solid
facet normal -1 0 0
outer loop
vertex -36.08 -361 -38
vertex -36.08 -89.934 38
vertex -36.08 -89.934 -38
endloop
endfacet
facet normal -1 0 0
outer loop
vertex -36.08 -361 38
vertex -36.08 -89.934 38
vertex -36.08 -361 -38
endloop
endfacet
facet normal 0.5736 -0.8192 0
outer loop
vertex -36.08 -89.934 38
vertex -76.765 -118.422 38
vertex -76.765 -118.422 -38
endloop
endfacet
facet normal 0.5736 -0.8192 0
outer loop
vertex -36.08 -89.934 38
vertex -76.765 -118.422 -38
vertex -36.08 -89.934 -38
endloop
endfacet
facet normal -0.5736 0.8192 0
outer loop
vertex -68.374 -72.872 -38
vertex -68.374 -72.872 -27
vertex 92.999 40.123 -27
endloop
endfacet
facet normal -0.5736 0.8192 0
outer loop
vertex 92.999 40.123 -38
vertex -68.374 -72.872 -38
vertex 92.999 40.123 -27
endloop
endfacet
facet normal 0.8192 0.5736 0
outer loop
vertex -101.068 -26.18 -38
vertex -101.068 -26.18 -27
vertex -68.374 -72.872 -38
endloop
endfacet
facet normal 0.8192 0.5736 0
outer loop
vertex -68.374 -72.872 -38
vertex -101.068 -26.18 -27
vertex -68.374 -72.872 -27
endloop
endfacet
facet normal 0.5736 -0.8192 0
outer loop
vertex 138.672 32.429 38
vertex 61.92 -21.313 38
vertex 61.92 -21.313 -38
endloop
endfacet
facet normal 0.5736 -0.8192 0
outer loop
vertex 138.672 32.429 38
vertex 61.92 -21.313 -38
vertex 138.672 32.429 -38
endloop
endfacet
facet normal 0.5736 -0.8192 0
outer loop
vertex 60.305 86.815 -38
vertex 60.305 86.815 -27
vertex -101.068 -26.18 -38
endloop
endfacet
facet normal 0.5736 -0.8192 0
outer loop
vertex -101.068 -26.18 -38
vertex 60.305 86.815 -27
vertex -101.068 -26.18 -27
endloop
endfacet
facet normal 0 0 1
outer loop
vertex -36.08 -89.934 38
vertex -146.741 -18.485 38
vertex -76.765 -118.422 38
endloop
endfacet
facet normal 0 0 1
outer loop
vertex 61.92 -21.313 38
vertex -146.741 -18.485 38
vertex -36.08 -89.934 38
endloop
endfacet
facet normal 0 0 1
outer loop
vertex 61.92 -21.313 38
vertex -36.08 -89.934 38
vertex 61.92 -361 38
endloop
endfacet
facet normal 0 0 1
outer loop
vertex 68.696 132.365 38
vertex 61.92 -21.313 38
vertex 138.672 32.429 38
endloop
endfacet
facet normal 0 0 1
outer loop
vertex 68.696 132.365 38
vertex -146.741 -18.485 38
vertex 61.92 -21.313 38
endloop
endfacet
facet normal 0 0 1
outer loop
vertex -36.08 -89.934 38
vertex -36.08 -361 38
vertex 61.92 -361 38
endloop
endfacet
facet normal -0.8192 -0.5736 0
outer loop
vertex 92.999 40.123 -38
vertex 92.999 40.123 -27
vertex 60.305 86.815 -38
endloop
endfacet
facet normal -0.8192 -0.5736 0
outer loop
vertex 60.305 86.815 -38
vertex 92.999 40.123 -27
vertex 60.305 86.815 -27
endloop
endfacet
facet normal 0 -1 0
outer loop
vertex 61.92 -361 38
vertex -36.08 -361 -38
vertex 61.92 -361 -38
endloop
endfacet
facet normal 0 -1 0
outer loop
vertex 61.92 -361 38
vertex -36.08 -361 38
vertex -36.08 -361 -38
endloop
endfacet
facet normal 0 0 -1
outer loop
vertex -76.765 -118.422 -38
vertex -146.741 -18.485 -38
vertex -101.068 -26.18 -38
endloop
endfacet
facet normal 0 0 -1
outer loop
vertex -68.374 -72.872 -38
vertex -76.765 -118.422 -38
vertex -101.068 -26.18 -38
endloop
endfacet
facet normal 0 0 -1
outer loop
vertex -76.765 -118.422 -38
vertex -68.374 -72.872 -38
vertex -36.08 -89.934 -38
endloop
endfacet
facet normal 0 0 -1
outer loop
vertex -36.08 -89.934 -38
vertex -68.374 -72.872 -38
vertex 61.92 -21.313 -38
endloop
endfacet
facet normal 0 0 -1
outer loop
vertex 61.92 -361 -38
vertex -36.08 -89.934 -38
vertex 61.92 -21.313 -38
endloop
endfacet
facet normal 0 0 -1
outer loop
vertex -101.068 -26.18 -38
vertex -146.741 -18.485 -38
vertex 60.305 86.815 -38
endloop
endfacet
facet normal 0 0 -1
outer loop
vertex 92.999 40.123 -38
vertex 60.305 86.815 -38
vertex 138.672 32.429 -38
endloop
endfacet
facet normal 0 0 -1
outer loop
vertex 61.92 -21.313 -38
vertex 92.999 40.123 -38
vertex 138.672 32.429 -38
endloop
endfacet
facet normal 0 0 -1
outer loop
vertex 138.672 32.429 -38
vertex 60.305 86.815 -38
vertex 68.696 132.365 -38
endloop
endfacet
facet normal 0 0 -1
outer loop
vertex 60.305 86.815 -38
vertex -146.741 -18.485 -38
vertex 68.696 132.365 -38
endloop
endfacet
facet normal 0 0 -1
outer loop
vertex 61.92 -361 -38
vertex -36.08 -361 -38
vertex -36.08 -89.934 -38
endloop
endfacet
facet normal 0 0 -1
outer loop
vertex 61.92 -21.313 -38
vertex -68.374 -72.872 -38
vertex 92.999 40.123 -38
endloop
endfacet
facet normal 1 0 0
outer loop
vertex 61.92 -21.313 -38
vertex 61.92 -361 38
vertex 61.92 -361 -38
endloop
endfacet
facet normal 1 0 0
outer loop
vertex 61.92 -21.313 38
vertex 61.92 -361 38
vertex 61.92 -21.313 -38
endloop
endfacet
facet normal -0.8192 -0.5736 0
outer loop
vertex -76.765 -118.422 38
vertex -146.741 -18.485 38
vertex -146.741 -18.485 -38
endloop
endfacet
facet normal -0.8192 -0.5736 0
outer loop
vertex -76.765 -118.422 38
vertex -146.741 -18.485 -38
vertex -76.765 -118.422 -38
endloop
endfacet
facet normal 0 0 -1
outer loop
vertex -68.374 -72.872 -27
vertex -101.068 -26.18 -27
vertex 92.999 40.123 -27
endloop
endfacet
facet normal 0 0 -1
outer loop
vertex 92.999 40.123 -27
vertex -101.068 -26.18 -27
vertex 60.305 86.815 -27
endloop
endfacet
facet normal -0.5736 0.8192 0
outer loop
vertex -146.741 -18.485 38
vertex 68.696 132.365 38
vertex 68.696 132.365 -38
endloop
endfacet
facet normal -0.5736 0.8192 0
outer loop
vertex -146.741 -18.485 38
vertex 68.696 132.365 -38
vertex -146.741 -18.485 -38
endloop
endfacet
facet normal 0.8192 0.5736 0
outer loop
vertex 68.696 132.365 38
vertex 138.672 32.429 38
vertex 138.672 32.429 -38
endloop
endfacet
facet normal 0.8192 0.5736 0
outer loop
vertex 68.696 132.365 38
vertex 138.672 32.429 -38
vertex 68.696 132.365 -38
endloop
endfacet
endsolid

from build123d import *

# Parameters (mm, degrees)
SALIENTE_EXTRUIR1_DEPTH = 38
CORTAR_EXTRUIR4_START   = -38
CORTAR_EXTRUIR4_DEPTH   = 11


with BuildPart() as part:
    # Croquis1 → Saliente-Extruir1 (new, symmetric)
    with BuildSketch(Plane.XY):
        Polygon((-1.079549163, -361), (61.920450837, -361), (61.920450837, -21.313279486), (138.671836045, 32.428619004), (68.69551081, 132.365168408), (-146.741476838, -18.485434353), (-76.765151603, -118.421983756), (-36.079549163, -89.933618231), (-36.079549163, -361), align=None)
    extrude(amount=SALIENTE_EXTRUIR1_DEPTH, both=True)

    # Croquis2 → Cortar-Extruir4 (cut, symmetric)
    with BuildSketch(Plane.XY.offset(CORTAR_EXTRUIR4_START)):
        Polygon((-101.068225195, -26.179853393), (-68.374368323, -72.871519917), (92.998584402, 40.123038044), (60.30472753, 86.814704569), align=None)
    extrude(amount=CORTAR_EXTRUIR4_DEPTH, both=True, mode=Mode.SUBTRACT)


solid = part.part
